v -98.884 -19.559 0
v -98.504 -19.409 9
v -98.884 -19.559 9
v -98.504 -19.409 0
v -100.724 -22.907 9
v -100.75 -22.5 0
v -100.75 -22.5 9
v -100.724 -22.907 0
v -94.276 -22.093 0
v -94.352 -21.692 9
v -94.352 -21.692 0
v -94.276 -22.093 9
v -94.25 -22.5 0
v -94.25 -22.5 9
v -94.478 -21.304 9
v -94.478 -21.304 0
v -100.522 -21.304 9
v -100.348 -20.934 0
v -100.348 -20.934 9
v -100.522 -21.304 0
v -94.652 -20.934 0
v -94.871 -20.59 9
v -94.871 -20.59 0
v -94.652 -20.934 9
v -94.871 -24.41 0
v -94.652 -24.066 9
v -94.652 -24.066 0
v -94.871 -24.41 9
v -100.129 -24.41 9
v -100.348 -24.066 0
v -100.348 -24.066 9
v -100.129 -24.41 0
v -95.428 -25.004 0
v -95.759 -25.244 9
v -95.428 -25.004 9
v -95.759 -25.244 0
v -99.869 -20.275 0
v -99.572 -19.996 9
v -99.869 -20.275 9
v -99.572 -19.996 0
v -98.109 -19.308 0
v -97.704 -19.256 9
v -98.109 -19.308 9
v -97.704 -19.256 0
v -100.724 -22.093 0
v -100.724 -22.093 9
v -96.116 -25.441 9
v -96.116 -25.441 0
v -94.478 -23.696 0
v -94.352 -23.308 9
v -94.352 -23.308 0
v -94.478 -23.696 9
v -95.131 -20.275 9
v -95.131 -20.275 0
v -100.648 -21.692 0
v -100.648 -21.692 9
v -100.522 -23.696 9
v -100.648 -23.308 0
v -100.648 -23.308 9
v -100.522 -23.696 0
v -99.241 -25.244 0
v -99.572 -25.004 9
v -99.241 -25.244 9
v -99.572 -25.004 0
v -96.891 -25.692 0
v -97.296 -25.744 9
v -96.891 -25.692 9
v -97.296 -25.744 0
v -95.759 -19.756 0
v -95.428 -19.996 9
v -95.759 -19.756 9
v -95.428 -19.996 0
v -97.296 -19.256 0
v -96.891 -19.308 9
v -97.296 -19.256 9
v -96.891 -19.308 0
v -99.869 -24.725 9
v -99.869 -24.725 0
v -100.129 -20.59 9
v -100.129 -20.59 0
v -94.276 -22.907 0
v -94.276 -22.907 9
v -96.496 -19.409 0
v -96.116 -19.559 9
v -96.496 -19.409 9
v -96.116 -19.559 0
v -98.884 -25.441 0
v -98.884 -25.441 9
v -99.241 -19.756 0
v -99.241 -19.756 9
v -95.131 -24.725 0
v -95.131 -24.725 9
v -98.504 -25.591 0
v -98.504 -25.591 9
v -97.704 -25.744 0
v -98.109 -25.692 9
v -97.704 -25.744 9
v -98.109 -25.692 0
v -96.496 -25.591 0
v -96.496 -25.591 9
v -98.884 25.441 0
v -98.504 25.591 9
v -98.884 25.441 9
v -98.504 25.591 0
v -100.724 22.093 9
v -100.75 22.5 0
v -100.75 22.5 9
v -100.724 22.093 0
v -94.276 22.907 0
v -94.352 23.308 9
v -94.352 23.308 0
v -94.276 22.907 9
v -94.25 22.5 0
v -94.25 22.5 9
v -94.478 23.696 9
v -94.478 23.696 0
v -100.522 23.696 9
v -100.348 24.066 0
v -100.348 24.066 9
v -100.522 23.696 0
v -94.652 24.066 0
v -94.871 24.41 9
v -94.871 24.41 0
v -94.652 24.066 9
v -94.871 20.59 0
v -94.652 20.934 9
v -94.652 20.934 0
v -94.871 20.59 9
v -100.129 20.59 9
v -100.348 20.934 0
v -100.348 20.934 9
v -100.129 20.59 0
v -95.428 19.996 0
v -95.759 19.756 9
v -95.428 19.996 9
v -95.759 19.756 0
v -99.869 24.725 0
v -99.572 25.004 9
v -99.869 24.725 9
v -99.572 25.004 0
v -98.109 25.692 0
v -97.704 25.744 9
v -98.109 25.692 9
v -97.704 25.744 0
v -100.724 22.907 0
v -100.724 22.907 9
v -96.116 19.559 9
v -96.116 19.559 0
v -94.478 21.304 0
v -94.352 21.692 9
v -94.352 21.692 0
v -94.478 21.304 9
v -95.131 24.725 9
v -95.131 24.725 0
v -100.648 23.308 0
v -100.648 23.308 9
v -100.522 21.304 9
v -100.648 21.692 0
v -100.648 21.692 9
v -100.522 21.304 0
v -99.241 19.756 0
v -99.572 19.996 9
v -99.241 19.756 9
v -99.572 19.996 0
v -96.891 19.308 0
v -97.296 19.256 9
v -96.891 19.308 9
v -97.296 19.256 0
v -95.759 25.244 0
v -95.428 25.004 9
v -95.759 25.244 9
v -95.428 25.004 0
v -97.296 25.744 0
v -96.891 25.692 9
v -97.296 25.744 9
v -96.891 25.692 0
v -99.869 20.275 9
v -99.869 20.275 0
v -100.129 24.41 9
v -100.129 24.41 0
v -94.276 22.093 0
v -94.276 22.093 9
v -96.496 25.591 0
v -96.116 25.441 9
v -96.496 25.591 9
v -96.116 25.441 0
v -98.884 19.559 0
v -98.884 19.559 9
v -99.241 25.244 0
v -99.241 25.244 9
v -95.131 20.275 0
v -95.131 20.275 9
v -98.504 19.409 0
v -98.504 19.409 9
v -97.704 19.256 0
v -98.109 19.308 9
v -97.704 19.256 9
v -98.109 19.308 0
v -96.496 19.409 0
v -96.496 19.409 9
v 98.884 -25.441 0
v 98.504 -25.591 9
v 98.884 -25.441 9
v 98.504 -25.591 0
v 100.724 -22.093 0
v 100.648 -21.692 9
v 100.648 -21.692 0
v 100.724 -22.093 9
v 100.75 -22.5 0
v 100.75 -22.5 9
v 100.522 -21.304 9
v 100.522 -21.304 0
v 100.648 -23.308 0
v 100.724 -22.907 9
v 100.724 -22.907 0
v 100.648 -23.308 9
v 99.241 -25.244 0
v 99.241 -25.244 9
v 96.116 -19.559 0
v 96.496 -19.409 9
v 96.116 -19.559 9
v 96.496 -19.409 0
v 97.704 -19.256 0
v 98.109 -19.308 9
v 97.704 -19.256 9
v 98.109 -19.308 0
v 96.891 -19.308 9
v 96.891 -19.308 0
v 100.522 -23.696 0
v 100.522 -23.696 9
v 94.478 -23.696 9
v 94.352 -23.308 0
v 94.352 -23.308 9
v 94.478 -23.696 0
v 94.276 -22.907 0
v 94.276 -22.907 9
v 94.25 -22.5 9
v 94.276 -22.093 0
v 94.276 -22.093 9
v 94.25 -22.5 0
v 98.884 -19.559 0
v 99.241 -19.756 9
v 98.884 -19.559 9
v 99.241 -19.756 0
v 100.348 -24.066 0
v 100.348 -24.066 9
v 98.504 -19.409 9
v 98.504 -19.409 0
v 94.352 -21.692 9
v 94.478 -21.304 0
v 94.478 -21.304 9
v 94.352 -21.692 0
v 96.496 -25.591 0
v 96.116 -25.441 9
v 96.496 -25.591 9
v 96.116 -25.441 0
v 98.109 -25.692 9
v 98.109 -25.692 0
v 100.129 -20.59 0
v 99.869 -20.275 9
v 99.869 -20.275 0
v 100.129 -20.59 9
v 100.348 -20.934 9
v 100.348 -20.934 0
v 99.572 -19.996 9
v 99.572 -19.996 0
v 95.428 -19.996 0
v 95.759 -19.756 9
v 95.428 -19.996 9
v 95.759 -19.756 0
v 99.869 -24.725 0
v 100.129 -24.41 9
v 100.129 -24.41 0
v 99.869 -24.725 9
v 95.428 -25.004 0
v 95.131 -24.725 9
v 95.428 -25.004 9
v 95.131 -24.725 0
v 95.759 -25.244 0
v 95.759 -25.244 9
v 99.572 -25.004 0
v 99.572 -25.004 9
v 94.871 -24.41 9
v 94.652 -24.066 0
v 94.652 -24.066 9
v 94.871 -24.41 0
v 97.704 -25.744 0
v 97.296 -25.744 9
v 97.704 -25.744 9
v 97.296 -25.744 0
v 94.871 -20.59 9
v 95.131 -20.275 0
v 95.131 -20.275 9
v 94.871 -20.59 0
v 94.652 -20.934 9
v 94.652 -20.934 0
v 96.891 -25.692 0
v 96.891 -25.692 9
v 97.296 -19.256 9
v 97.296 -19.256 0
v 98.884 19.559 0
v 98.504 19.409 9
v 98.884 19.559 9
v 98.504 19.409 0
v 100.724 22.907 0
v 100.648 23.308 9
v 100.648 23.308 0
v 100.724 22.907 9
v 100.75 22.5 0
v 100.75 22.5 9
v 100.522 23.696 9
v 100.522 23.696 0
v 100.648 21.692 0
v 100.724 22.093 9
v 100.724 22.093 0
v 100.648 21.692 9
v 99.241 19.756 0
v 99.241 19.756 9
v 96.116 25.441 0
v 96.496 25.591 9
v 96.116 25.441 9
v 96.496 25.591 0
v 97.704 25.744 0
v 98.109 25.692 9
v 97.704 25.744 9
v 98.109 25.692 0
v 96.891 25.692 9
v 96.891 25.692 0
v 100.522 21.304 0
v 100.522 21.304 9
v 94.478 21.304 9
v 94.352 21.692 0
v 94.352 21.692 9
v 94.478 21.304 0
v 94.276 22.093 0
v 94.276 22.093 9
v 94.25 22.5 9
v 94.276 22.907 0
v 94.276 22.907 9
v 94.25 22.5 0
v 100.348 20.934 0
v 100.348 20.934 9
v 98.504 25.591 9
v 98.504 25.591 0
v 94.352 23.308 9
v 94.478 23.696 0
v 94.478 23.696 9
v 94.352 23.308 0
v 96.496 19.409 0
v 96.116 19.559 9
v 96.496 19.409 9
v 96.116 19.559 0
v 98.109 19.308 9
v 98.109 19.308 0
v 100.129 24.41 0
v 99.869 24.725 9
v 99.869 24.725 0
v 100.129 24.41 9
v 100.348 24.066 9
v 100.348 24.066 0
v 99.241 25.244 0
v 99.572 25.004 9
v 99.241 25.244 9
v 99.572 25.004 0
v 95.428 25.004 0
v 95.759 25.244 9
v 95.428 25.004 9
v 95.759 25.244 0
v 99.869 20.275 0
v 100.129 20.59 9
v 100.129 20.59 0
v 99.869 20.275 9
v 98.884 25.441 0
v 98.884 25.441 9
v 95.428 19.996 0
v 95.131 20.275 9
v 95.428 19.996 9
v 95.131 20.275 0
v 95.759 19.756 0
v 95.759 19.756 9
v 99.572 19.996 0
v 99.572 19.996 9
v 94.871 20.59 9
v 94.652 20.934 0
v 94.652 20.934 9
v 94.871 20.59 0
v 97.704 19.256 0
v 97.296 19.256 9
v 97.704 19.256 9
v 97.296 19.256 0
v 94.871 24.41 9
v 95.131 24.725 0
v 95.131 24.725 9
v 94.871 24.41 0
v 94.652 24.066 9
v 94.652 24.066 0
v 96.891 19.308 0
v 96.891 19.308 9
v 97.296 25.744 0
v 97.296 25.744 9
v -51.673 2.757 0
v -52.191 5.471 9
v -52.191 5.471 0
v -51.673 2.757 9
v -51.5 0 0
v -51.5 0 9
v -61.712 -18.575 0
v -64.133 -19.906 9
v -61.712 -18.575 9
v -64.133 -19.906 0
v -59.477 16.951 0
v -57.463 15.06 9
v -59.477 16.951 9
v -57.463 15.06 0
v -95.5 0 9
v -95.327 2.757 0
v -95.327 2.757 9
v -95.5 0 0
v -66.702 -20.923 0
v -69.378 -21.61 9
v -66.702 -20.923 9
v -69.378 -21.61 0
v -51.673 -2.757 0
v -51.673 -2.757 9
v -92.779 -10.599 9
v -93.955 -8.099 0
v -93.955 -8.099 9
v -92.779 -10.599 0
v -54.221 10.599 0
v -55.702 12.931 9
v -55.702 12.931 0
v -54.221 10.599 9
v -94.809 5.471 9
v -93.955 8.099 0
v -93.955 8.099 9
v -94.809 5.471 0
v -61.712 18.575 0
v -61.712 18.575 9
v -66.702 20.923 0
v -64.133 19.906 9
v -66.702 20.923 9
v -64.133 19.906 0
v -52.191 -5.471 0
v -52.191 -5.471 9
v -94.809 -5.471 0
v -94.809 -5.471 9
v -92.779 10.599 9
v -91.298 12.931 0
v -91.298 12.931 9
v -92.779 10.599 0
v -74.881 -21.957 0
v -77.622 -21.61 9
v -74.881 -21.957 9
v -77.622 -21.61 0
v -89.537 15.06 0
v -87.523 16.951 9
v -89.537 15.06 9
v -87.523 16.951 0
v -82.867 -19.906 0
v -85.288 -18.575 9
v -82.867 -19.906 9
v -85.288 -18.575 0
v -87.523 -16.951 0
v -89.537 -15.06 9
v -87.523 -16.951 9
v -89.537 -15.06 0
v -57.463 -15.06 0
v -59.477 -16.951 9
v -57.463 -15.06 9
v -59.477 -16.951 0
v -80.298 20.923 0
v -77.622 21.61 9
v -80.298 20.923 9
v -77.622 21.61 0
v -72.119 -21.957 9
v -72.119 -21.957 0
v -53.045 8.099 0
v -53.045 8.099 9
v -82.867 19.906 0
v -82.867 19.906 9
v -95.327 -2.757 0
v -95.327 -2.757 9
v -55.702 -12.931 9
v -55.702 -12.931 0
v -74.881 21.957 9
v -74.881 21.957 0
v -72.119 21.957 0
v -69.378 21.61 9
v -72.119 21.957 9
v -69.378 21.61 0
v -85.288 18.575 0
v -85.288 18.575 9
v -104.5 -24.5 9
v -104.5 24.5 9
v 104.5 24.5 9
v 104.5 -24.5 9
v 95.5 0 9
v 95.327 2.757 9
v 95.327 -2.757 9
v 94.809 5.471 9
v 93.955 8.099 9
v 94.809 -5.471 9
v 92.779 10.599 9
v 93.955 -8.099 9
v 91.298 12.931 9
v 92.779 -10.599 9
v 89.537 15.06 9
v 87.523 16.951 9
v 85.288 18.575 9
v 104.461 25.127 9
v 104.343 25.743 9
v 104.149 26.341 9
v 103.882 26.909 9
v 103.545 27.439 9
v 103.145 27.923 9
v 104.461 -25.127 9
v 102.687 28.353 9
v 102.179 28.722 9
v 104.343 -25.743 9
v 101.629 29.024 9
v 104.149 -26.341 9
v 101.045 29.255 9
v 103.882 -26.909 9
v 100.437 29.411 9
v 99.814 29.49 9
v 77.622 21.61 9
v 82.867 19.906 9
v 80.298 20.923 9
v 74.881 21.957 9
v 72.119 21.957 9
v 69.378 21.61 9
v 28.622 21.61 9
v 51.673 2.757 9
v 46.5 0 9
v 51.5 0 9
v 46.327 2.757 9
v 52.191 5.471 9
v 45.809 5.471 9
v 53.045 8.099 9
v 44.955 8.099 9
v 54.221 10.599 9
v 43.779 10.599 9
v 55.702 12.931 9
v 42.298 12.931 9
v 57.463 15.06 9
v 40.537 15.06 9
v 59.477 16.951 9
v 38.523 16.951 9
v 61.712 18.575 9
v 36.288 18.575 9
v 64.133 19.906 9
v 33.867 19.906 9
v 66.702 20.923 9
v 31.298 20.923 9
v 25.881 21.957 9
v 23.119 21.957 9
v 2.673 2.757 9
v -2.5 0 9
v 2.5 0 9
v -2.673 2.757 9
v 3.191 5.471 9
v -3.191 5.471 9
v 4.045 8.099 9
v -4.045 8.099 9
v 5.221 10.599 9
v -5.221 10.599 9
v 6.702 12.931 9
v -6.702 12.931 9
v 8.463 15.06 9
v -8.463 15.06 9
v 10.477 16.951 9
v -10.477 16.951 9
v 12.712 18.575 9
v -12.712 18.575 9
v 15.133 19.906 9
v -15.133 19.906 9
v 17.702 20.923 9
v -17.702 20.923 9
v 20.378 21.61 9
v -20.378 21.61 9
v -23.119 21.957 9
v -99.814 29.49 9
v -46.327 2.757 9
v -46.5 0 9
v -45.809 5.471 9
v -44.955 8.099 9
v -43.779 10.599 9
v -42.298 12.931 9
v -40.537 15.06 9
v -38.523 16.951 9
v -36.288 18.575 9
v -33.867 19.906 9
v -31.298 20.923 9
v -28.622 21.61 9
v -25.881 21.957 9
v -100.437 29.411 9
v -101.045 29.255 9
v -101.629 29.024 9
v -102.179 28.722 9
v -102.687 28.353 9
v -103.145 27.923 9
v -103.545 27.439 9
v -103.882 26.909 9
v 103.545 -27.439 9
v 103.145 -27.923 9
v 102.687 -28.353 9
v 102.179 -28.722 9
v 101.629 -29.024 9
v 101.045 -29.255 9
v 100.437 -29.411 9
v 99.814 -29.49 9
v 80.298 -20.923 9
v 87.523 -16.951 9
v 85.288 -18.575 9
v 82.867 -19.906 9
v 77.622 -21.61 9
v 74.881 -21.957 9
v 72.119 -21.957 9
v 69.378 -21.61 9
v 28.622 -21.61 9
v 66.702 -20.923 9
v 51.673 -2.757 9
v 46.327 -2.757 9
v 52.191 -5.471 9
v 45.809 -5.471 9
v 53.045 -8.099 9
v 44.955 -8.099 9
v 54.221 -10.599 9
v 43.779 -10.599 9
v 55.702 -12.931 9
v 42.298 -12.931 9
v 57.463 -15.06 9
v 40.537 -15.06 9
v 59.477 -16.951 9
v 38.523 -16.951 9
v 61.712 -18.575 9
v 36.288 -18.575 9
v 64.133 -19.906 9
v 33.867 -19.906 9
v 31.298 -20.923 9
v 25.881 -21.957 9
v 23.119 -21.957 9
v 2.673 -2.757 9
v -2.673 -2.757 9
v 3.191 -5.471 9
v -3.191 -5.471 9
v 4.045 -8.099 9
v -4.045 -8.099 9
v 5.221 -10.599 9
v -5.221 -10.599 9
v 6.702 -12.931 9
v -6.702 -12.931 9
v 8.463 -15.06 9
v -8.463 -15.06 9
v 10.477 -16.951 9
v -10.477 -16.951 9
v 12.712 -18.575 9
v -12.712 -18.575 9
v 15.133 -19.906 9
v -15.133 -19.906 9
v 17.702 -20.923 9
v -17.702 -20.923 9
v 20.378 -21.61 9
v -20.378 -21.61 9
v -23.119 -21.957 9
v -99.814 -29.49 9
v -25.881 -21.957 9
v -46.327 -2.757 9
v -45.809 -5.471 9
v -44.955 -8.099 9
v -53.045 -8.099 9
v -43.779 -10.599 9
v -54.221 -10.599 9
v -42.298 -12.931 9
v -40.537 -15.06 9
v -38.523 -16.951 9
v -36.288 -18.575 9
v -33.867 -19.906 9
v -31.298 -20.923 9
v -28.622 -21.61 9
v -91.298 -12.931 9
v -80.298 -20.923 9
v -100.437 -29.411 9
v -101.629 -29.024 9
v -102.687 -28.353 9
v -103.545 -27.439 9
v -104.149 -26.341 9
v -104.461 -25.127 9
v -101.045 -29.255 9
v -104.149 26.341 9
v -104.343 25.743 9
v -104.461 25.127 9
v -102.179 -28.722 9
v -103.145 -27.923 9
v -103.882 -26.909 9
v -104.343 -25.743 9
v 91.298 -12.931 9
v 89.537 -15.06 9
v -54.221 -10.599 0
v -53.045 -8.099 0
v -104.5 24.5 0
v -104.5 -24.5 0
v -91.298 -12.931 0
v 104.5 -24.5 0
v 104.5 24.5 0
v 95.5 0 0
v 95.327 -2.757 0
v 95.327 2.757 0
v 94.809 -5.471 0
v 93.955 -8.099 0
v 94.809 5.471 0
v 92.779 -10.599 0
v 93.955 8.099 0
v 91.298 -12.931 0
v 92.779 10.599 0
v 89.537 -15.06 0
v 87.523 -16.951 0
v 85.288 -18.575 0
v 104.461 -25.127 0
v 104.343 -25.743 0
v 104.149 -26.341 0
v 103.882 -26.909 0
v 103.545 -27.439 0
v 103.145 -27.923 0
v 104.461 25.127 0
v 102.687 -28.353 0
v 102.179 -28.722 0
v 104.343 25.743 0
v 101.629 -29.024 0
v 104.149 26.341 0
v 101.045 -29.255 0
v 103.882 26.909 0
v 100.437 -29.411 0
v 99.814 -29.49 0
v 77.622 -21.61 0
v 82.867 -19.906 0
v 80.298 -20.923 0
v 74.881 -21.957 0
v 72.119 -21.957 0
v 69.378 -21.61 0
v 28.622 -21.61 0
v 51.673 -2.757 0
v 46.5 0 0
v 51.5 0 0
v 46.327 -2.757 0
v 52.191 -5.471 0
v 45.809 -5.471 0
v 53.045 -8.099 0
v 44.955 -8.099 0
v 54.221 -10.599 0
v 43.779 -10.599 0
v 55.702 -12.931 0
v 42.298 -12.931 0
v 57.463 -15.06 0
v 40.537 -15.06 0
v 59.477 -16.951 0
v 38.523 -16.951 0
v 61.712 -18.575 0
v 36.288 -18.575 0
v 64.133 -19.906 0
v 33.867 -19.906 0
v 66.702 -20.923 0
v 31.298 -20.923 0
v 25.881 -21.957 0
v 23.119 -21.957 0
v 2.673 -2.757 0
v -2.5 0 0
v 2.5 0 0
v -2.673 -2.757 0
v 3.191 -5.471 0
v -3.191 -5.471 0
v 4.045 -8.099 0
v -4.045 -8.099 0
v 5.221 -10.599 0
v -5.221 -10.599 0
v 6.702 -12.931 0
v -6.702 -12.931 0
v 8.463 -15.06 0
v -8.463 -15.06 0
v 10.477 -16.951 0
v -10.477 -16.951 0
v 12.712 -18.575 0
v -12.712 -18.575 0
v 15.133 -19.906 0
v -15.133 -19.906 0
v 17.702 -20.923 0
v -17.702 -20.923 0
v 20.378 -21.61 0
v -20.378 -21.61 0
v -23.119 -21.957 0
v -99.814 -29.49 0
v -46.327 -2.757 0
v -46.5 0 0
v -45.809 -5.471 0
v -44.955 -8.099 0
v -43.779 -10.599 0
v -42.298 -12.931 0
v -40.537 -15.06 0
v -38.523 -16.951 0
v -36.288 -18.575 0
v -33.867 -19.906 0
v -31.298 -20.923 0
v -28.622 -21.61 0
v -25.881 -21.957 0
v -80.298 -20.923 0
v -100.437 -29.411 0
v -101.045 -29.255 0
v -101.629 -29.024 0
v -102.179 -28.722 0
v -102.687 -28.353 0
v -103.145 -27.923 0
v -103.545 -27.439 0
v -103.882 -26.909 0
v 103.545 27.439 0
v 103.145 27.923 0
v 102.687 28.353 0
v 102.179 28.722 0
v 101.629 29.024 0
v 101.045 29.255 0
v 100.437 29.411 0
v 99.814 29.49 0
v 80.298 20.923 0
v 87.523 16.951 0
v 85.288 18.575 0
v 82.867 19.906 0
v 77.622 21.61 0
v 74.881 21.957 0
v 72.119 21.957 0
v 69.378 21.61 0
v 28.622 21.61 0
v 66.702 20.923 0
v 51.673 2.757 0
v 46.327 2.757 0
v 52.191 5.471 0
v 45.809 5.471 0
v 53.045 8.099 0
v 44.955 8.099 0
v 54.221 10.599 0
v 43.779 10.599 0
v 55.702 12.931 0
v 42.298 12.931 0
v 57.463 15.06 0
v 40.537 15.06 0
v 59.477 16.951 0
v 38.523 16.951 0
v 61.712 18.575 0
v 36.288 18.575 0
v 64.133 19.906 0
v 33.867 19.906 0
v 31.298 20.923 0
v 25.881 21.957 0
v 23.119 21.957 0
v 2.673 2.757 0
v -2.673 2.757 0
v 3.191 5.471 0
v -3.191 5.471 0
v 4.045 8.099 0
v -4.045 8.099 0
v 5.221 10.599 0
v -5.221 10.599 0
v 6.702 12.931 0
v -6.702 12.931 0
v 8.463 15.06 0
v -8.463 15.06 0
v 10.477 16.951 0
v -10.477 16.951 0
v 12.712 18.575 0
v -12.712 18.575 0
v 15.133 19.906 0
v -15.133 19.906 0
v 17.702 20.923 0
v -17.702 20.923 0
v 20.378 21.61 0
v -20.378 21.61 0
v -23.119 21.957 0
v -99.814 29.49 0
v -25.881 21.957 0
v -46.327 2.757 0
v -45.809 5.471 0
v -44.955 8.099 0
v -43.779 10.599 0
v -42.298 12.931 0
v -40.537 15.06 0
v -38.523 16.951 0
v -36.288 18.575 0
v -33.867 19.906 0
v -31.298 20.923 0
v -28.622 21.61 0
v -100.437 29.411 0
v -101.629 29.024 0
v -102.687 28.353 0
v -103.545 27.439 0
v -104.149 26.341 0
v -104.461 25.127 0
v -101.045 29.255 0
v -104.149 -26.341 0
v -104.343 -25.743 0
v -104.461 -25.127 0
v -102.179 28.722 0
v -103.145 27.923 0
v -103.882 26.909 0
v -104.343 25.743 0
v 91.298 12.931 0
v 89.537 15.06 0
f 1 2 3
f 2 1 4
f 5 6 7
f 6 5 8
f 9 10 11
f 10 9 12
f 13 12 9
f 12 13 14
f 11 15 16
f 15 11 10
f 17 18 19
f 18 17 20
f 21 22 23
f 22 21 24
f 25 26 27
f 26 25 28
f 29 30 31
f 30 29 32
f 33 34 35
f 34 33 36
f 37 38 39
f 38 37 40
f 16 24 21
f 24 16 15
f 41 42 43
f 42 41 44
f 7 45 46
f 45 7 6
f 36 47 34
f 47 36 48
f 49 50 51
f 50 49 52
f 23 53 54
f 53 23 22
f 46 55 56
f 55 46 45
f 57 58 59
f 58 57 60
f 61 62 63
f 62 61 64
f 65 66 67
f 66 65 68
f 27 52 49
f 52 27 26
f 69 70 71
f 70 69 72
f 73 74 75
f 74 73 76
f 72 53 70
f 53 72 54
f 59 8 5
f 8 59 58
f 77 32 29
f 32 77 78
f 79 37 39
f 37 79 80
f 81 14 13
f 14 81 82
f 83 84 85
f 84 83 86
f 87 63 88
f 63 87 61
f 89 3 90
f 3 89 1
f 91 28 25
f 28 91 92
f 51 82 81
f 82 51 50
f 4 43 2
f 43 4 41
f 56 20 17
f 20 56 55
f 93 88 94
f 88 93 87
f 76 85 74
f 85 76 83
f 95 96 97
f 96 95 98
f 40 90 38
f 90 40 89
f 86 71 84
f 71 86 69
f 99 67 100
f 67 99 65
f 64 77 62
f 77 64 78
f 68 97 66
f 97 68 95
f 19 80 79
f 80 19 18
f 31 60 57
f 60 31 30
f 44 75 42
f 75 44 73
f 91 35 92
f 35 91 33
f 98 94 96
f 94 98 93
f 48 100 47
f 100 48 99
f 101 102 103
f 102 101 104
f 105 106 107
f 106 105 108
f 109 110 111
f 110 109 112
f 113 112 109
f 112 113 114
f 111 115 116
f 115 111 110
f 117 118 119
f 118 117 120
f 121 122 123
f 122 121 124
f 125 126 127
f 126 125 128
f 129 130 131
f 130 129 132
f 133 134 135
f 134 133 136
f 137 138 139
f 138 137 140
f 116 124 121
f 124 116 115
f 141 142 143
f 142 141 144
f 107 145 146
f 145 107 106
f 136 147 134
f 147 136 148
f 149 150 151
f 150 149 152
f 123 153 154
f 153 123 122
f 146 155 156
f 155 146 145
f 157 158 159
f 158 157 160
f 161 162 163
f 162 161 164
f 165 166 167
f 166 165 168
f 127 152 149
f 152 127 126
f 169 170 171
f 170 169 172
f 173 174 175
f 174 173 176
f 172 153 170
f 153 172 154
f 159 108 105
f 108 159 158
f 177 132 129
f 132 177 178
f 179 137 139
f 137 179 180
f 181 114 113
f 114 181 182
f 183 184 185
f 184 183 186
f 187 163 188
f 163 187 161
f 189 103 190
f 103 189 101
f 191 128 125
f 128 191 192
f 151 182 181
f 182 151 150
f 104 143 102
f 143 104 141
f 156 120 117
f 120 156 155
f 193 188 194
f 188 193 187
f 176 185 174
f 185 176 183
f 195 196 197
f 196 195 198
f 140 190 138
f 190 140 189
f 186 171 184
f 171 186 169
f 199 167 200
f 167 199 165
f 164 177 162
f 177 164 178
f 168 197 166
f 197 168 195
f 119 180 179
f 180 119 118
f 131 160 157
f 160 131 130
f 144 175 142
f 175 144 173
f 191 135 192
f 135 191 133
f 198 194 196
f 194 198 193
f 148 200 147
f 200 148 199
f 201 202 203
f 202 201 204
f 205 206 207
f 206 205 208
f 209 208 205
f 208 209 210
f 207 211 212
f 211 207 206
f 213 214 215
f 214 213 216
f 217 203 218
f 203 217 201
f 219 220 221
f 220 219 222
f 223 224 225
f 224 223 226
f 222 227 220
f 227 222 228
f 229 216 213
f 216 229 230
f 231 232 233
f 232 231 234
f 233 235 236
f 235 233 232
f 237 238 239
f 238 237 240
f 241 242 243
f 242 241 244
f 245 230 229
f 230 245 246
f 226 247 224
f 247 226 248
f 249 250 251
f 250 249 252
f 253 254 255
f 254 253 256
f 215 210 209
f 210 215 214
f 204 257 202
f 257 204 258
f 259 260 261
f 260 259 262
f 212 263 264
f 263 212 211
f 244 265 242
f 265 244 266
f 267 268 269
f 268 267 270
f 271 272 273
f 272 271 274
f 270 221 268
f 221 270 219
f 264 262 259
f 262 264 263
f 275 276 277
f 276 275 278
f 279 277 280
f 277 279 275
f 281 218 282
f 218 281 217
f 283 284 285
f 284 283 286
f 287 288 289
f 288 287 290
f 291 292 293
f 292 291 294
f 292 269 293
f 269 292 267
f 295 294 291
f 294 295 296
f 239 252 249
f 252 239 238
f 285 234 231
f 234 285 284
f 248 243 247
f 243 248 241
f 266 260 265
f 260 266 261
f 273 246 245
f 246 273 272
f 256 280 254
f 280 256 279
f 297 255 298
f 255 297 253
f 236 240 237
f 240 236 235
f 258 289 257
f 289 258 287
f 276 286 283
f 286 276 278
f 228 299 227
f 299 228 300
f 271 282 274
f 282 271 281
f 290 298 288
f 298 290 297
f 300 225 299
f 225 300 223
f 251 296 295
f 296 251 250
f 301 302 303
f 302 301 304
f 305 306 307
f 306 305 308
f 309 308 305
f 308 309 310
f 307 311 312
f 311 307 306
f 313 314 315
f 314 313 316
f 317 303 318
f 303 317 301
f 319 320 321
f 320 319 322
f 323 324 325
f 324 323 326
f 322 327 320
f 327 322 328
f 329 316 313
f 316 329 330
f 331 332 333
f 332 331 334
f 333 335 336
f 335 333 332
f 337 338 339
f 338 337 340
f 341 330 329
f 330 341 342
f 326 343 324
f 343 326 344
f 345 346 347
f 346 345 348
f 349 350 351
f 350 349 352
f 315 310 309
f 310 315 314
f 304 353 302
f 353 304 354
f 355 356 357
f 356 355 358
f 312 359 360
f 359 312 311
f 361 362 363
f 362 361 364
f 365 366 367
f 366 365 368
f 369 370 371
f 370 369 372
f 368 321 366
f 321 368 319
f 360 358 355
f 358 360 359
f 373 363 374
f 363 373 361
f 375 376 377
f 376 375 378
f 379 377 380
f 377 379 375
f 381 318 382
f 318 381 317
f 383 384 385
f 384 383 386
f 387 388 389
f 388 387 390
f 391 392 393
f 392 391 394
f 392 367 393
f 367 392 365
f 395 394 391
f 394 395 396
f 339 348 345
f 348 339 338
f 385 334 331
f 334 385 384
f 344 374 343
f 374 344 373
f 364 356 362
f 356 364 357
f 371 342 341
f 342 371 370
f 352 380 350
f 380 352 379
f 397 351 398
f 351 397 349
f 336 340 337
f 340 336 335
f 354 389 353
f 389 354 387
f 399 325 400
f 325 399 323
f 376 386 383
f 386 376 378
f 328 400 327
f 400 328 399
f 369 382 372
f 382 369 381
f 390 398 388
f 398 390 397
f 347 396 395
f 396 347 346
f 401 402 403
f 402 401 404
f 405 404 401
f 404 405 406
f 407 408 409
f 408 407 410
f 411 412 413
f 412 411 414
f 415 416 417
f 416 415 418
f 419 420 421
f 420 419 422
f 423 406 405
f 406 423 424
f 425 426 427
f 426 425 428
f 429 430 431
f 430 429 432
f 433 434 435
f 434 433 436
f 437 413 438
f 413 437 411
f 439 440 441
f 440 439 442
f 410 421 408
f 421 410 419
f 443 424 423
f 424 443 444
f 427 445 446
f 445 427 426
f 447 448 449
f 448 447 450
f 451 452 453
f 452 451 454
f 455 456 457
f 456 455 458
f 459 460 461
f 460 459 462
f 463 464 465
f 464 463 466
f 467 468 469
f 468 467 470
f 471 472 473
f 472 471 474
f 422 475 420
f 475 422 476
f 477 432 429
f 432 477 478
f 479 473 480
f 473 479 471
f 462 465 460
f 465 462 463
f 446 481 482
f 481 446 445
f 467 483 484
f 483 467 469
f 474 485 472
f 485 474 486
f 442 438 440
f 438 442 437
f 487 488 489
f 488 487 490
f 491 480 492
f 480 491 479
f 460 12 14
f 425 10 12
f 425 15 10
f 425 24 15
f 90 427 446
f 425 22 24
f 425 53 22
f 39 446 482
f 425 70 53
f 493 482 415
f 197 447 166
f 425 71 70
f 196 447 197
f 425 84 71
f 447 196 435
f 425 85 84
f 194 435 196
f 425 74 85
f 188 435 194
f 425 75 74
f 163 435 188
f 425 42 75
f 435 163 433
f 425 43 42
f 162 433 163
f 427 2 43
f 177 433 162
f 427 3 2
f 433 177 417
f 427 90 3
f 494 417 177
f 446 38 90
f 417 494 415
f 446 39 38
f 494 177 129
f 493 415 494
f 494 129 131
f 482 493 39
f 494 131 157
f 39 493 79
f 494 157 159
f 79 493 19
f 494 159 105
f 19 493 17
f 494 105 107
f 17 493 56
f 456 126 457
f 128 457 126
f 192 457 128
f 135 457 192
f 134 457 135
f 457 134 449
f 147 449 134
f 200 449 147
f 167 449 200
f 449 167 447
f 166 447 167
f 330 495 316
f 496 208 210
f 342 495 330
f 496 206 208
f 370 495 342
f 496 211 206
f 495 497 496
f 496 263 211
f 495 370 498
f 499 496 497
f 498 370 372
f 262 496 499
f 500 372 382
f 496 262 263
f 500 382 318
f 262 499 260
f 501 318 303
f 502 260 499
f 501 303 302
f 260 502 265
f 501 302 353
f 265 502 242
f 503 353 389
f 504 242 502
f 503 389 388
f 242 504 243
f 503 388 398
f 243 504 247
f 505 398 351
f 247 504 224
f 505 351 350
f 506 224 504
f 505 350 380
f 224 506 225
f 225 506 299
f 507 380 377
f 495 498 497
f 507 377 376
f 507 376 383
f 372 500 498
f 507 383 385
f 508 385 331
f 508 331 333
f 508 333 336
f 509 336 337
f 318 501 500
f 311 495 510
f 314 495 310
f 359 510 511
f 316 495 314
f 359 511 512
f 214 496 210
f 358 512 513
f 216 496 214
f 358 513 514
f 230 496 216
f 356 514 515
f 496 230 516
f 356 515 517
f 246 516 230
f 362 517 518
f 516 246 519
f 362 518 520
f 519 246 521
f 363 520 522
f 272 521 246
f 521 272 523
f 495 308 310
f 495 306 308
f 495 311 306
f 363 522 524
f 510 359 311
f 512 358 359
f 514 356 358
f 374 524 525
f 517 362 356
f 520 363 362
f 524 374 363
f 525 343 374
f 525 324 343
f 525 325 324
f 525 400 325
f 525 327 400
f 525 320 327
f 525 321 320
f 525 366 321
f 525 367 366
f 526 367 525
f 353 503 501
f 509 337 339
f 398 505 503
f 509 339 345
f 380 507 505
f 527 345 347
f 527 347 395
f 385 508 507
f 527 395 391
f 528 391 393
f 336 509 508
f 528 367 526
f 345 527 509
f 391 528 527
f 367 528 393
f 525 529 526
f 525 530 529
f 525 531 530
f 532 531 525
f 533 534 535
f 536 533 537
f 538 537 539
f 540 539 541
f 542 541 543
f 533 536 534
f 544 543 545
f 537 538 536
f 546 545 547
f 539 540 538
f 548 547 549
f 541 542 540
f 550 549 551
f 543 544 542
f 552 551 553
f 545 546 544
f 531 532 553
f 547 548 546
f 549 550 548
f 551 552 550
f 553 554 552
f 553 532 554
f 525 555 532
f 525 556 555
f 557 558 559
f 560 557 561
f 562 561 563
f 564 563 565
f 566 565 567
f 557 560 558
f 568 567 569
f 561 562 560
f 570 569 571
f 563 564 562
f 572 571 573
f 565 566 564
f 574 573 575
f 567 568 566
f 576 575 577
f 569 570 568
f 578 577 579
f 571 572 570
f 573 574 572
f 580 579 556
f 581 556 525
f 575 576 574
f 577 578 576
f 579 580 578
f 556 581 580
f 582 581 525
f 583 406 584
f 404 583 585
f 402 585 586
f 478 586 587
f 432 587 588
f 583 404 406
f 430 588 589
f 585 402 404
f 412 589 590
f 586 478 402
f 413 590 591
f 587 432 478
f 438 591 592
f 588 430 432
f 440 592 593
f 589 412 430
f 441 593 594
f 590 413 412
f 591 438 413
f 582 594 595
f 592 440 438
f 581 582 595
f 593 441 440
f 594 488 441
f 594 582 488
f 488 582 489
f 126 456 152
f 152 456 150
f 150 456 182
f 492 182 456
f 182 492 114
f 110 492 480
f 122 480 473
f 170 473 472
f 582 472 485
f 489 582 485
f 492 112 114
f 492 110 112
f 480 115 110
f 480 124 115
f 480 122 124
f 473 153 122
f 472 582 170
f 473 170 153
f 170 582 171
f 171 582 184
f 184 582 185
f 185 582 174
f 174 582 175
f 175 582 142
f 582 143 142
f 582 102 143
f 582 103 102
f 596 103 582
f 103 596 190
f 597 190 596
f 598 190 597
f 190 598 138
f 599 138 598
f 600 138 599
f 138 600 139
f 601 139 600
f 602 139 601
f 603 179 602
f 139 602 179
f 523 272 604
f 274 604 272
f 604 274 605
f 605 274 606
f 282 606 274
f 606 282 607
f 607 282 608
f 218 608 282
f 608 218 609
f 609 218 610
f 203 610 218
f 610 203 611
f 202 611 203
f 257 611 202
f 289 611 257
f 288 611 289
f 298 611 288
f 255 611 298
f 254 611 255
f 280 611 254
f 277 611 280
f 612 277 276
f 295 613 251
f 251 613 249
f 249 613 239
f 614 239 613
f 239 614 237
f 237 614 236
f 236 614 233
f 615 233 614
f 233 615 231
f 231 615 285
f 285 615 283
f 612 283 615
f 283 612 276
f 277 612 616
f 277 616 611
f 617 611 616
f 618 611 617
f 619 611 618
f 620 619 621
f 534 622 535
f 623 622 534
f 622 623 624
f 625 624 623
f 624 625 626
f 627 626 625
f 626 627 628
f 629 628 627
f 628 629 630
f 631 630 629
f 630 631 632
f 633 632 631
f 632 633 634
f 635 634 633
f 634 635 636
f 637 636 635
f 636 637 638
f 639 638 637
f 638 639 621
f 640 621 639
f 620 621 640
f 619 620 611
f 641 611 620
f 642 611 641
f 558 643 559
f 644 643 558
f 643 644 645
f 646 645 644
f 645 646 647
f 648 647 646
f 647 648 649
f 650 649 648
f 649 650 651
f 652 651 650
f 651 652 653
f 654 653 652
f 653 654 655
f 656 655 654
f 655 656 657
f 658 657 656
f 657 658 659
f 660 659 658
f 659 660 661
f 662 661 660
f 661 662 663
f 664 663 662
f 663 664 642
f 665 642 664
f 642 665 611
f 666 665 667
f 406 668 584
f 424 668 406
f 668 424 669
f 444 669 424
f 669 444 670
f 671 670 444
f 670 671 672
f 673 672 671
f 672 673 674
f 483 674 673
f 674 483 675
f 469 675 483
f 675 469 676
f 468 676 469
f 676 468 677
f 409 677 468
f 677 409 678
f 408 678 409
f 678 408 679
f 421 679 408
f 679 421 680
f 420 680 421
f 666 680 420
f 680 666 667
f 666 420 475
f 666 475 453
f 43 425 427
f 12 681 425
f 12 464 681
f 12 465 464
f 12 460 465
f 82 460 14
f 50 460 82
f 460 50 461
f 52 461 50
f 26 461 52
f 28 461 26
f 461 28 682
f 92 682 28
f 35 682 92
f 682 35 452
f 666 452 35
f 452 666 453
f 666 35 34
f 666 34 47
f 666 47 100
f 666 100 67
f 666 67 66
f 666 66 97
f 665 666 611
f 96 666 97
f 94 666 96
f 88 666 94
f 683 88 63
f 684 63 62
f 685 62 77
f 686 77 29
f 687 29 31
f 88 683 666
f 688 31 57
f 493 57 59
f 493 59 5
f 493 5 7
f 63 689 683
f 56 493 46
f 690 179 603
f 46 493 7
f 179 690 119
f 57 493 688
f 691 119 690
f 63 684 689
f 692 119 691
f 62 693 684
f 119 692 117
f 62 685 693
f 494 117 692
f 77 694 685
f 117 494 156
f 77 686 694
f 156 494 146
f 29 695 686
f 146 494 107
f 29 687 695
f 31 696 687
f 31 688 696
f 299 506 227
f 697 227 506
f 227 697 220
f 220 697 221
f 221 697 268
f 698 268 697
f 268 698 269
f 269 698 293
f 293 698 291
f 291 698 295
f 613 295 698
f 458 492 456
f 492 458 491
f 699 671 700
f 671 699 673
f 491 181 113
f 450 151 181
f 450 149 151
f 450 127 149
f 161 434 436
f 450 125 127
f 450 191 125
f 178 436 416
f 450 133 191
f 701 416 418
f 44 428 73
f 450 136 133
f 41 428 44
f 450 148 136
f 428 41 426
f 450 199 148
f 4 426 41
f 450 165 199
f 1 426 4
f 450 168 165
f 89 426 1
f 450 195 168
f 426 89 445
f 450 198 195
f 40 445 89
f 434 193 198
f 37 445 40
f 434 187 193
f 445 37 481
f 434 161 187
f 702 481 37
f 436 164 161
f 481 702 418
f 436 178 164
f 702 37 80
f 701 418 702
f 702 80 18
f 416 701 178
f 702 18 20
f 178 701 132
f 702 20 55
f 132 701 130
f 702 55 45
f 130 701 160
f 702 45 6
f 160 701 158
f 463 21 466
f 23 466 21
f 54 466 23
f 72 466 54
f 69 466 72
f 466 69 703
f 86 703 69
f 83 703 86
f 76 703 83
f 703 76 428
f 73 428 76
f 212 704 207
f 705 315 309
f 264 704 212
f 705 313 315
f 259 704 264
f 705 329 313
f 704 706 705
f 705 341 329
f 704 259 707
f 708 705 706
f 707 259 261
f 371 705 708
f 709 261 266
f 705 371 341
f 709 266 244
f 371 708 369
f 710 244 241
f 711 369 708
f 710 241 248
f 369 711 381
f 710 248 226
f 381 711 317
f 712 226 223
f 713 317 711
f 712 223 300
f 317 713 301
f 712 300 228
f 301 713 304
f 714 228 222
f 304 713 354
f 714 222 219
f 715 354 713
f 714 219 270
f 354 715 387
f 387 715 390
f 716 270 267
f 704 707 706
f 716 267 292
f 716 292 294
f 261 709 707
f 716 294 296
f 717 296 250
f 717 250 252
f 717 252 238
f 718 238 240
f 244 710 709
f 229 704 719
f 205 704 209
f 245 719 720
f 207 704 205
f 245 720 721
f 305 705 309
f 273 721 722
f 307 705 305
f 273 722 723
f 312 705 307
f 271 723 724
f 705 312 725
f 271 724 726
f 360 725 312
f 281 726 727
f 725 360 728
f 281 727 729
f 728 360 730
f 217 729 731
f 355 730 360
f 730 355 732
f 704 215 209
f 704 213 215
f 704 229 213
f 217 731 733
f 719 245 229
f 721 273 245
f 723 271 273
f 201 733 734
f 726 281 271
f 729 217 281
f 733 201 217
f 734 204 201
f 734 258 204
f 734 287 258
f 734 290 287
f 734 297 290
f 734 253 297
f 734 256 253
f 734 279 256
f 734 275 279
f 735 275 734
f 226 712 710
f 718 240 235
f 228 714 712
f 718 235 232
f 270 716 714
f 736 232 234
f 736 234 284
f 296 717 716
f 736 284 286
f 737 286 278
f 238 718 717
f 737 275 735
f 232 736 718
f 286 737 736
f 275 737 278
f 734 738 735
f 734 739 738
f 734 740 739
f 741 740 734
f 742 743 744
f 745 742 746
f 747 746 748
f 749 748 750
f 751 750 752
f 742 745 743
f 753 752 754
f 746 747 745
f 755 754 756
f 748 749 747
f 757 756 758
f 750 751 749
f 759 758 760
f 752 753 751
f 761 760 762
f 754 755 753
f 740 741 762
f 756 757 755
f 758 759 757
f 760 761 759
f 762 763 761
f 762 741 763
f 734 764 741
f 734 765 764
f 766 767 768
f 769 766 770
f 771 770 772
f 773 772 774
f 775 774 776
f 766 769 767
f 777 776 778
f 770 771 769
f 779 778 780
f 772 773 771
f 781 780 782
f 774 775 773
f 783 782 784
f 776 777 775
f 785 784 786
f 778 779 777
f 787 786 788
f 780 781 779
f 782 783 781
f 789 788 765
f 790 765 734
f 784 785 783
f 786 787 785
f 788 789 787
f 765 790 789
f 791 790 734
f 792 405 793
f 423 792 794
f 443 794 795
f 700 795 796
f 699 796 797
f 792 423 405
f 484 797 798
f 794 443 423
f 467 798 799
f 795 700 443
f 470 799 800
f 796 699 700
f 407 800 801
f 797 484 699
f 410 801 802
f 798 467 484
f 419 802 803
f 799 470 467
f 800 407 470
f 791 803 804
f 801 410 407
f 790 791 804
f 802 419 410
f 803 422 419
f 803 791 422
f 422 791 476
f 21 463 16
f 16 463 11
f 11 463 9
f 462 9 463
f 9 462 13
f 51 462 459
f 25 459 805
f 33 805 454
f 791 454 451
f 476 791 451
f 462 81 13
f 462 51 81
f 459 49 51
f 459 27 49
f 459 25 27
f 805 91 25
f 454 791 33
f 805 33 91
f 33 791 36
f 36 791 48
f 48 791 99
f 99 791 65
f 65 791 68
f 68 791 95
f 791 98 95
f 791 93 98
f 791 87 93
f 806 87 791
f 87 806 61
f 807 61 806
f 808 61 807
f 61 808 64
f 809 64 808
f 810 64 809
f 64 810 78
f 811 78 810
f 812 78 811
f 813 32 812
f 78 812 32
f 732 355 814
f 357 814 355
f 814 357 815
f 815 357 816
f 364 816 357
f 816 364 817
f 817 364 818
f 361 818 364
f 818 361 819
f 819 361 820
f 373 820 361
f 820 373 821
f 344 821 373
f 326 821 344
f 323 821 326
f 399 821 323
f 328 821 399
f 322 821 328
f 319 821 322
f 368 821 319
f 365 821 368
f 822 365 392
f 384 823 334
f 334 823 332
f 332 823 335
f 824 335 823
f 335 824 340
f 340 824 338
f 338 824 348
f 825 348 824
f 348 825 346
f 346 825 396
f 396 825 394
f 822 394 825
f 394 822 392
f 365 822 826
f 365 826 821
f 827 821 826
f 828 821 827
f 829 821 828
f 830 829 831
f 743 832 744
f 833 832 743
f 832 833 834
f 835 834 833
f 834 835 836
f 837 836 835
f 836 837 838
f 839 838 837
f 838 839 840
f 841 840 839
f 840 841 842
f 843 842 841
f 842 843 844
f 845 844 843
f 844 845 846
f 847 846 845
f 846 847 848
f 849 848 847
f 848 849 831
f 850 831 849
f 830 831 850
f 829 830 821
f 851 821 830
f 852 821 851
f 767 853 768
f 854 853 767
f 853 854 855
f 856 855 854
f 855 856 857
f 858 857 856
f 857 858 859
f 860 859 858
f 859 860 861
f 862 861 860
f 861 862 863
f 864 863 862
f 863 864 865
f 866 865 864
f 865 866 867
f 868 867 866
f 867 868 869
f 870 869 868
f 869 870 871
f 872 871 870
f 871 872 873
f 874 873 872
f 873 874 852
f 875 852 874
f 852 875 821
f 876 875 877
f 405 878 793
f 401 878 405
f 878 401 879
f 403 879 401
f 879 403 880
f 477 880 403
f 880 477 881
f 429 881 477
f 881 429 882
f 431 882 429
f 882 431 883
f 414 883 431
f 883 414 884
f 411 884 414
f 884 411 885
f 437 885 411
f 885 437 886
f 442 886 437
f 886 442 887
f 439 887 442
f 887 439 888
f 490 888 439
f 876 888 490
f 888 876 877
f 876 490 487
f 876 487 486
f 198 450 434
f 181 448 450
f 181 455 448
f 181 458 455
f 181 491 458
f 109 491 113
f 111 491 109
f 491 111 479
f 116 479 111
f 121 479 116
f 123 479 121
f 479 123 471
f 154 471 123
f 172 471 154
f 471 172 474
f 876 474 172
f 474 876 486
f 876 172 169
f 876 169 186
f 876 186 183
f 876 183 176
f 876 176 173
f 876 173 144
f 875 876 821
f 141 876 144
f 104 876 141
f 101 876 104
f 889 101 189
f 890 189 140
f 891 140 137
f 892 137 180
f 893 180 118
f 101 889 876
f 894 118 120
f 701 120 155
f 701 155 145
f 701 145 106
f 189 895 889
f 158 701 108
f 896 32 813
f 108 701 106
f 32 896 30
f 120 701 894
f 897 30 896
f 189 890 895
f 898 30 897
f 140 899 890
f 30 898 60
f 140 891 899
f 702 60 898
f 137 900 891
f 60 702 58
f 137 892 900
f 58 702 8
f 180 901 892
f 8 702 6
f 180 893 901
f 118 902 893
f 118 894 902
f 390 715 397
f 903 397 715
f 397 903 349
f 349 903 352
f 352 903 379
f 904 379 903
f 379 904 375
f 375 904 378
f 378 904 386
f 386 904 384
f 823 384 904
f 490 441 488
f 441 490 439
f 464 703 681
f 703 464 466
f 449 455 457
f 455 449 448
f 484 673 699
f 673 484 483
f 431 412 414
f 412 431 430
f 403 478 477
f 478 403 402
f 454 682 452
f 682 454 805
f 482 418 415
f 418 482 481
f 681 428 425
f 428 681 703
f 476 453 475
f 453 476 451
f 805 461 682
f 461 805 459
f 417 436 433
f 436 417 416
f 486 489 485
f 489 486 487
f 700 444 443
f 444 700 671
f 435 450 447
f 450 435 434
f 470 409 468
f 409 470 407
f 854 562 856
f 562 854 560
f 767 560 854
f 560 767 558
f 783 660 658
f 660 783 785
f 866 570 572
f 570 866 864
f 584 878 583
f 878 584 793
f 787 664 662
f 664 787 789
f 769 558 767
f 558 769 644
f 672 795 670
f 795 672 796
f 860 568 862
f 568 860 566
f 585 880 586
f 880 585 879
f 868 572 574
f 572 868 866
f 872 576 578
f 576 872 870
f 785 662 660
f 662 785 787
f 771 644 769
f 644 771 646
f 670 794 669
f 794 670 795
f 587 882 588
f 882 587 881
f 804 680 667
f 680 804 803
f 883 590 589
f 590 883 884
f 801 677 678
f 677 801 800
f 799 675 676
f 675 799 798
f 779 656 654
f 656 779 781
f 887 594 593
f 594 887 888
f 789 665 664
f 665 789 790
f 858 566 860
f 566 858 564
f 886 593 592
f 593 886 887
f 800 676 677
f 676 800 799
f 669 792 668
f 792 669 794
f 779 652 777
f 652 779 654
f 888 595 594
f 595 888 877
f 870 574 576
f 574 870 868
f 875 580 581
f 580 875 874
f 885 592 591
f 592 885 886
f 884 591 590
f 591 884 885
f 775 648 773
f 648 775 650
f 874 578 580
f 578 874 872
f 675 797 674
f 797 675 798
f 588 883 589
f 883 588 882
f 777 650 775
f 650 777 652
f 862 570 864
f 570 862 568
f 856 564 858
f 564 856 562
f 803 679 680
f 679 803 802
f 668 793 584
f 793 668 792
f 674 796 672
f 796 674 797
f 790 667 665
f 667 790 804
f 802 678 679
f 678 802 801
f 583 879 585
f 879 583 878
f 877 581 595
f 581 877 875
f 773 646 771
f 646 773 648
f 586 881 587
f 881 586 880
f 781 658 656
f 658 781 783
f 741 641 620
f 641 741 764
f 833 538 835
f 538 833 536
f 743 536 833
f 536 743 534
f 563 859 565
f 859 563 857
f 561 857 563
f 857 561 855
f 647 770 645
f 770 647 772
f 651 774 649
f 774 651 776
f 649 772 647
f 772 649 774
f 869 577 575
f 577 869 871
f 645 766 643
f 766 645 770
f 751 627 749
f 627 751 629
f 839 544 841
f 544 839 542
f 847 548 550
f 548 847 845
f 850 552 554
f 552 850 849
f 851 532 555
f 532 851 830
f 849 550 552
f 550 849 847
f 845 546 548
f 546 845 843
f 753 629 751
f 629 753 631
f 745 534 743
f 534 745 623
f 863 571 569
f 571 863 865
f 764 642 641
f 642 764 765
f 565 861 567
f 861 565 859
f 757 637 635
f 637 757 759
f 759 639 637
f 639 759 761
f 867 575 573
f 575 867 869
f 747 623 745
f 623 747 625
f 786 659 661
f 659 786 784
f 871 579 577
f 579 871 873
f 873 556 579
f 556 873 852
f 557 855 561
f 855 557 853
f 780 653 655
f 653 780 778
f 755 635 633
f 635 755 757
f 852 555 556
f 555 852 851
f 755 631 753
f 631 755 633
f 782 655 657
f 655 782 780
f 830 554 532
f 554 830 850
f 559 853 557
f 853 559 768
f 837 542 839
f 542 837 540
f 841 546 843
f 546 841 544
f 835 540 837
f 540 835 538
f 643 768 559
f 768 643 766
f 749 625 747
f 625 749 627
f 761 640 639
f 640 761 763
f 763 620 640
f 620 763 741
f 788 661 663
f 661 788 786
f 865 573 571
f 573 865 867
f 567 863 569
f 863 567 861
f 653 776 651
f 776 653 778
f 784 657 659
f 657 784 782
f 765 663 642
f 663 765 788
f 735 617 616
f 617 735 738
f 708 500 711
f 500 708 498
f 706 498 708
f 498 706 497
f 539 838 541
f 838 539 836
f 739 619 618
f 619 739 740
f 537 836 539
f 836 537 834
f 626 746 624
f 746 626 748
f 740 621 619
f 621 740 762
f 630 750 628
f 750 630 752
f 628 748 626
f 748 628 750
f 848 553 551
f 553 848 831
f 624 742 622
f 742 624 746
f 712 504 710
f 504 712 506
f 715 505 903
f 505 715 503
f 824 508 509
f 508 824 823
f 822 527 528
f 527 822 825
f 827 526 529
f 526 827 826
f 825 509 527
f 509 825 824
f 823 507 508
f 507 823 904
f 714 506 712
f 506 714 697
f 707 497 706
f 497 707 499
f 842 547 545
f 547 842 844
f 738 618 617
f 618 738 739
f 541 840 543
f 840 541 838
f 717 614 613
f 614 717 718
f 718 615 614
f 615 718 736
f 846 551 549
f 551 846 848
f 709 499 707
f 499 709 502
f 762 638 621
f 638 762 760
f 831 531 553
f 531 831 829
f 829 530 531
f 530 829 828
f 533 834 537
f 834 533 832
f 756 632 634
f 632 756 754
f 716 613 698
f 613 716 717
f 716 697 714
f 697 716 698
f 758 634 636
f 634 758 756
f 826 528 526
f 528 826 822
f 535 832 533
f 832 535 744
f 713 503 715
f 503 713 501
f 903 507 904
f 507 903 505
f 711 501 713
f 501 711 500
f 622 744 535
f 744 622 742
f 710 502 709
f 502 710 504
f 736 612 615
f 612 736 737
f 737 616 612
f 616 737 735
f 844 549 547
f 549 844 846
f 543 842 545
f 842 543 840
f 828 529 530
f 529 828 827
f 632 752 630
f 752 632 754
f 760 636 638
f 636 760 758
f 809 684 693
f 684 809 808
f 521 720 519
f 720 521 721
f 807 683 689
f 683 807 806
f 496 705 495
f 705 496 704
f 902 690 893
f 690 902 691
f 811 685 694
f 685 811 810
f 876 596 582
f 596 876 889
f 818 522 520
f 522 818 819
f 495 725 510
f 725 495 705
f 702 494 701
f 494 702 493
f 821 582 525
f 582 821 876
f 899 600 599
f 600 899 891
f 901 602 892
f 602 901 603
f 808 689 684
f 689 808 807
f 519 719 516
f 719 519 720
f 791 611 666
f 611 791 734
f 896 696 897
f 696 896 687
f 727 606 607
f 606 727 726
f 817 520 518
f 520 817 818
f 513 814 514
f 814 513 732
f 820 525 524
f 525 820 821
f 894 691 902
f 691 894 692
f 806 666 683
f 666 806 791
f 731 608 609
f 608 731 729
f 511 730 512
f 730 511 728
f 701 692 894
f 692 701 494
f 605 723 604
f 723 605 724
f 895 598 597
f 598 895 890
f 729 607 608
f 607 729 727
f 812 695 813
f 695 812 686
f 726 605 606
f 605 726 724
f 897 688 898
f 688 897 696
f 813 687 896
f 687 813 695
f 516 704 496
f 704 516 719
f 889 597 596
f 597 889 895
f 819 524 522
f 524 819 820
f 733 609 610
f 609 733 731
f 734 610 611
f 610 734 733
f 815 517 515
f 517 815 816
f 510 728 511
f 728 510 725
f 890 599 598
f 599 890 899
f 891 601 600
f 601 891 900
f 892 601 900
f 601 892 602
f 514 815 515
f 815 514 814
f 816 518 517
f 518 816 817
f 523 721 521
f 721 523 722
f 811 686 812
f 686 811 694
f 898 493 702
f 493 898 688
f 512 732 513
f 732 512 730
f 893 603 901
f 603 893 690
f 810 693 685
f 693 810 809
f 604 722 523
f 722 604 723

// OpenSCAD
$fn = 50;


difference() {
	union() {
		hull() {
			translate(v = [-99.5000000000, 24.5000000000, 0]) {
				cylinder(h = 9, r = 5);
			}
			translate(v = [99.5000000000, 24.5000000000, 0]) {
				cylinder(h = 9, r = 5);
			}
			translate(v = [-99.5000000000, -24.5000000000, 0]) {
				cylinder(h = 9, r = 5);
			}
			translate(v = [99.5000000000, -24.5000000000, 0]) {
				cylinder(h = 9, r = 5);
			}
		}
	}
	union() {
		#translate(v = [-97.5000000000, -22.5000000000, -100.0000000000]) {
			cylinder(h = 200, r = 3.2500000000);
		}
		#translate(v = [-97.5000000000, 22.5000000000, -100.0000000000]) {
			cylinder(h = 200, r = 3.2500000000);
		}
		#translate(v = [97.5000000000, -22.5000000000, -100.0000000000]) {
			cylinder(h = 200, r = 3.2500000000);
		}
		#translate(v = [97.5000000000, 22.5000000000, -100.0000000000]) {
			cylinder(h = 200, r = 3.2500000000);
		}
		#translate(v = [-73.5000000000, 0, 0]) {
			cylinder(h = 9, r = 22.0000000000);
		}
		#translate(v = [-24.5000000000, 0, 0]) {
			cylinder(h = 9, r = 22.0000000000);
		}
		#translate(v = [24.5000000000, 0, 0]) {
			cylinder(h = 9, r = 22.0000000000);
		}
		#translate(v = [73.5000000000, 0, 0]) {
			cylinder(h = 9, r = 22.0000000000);
		}
	}
}
